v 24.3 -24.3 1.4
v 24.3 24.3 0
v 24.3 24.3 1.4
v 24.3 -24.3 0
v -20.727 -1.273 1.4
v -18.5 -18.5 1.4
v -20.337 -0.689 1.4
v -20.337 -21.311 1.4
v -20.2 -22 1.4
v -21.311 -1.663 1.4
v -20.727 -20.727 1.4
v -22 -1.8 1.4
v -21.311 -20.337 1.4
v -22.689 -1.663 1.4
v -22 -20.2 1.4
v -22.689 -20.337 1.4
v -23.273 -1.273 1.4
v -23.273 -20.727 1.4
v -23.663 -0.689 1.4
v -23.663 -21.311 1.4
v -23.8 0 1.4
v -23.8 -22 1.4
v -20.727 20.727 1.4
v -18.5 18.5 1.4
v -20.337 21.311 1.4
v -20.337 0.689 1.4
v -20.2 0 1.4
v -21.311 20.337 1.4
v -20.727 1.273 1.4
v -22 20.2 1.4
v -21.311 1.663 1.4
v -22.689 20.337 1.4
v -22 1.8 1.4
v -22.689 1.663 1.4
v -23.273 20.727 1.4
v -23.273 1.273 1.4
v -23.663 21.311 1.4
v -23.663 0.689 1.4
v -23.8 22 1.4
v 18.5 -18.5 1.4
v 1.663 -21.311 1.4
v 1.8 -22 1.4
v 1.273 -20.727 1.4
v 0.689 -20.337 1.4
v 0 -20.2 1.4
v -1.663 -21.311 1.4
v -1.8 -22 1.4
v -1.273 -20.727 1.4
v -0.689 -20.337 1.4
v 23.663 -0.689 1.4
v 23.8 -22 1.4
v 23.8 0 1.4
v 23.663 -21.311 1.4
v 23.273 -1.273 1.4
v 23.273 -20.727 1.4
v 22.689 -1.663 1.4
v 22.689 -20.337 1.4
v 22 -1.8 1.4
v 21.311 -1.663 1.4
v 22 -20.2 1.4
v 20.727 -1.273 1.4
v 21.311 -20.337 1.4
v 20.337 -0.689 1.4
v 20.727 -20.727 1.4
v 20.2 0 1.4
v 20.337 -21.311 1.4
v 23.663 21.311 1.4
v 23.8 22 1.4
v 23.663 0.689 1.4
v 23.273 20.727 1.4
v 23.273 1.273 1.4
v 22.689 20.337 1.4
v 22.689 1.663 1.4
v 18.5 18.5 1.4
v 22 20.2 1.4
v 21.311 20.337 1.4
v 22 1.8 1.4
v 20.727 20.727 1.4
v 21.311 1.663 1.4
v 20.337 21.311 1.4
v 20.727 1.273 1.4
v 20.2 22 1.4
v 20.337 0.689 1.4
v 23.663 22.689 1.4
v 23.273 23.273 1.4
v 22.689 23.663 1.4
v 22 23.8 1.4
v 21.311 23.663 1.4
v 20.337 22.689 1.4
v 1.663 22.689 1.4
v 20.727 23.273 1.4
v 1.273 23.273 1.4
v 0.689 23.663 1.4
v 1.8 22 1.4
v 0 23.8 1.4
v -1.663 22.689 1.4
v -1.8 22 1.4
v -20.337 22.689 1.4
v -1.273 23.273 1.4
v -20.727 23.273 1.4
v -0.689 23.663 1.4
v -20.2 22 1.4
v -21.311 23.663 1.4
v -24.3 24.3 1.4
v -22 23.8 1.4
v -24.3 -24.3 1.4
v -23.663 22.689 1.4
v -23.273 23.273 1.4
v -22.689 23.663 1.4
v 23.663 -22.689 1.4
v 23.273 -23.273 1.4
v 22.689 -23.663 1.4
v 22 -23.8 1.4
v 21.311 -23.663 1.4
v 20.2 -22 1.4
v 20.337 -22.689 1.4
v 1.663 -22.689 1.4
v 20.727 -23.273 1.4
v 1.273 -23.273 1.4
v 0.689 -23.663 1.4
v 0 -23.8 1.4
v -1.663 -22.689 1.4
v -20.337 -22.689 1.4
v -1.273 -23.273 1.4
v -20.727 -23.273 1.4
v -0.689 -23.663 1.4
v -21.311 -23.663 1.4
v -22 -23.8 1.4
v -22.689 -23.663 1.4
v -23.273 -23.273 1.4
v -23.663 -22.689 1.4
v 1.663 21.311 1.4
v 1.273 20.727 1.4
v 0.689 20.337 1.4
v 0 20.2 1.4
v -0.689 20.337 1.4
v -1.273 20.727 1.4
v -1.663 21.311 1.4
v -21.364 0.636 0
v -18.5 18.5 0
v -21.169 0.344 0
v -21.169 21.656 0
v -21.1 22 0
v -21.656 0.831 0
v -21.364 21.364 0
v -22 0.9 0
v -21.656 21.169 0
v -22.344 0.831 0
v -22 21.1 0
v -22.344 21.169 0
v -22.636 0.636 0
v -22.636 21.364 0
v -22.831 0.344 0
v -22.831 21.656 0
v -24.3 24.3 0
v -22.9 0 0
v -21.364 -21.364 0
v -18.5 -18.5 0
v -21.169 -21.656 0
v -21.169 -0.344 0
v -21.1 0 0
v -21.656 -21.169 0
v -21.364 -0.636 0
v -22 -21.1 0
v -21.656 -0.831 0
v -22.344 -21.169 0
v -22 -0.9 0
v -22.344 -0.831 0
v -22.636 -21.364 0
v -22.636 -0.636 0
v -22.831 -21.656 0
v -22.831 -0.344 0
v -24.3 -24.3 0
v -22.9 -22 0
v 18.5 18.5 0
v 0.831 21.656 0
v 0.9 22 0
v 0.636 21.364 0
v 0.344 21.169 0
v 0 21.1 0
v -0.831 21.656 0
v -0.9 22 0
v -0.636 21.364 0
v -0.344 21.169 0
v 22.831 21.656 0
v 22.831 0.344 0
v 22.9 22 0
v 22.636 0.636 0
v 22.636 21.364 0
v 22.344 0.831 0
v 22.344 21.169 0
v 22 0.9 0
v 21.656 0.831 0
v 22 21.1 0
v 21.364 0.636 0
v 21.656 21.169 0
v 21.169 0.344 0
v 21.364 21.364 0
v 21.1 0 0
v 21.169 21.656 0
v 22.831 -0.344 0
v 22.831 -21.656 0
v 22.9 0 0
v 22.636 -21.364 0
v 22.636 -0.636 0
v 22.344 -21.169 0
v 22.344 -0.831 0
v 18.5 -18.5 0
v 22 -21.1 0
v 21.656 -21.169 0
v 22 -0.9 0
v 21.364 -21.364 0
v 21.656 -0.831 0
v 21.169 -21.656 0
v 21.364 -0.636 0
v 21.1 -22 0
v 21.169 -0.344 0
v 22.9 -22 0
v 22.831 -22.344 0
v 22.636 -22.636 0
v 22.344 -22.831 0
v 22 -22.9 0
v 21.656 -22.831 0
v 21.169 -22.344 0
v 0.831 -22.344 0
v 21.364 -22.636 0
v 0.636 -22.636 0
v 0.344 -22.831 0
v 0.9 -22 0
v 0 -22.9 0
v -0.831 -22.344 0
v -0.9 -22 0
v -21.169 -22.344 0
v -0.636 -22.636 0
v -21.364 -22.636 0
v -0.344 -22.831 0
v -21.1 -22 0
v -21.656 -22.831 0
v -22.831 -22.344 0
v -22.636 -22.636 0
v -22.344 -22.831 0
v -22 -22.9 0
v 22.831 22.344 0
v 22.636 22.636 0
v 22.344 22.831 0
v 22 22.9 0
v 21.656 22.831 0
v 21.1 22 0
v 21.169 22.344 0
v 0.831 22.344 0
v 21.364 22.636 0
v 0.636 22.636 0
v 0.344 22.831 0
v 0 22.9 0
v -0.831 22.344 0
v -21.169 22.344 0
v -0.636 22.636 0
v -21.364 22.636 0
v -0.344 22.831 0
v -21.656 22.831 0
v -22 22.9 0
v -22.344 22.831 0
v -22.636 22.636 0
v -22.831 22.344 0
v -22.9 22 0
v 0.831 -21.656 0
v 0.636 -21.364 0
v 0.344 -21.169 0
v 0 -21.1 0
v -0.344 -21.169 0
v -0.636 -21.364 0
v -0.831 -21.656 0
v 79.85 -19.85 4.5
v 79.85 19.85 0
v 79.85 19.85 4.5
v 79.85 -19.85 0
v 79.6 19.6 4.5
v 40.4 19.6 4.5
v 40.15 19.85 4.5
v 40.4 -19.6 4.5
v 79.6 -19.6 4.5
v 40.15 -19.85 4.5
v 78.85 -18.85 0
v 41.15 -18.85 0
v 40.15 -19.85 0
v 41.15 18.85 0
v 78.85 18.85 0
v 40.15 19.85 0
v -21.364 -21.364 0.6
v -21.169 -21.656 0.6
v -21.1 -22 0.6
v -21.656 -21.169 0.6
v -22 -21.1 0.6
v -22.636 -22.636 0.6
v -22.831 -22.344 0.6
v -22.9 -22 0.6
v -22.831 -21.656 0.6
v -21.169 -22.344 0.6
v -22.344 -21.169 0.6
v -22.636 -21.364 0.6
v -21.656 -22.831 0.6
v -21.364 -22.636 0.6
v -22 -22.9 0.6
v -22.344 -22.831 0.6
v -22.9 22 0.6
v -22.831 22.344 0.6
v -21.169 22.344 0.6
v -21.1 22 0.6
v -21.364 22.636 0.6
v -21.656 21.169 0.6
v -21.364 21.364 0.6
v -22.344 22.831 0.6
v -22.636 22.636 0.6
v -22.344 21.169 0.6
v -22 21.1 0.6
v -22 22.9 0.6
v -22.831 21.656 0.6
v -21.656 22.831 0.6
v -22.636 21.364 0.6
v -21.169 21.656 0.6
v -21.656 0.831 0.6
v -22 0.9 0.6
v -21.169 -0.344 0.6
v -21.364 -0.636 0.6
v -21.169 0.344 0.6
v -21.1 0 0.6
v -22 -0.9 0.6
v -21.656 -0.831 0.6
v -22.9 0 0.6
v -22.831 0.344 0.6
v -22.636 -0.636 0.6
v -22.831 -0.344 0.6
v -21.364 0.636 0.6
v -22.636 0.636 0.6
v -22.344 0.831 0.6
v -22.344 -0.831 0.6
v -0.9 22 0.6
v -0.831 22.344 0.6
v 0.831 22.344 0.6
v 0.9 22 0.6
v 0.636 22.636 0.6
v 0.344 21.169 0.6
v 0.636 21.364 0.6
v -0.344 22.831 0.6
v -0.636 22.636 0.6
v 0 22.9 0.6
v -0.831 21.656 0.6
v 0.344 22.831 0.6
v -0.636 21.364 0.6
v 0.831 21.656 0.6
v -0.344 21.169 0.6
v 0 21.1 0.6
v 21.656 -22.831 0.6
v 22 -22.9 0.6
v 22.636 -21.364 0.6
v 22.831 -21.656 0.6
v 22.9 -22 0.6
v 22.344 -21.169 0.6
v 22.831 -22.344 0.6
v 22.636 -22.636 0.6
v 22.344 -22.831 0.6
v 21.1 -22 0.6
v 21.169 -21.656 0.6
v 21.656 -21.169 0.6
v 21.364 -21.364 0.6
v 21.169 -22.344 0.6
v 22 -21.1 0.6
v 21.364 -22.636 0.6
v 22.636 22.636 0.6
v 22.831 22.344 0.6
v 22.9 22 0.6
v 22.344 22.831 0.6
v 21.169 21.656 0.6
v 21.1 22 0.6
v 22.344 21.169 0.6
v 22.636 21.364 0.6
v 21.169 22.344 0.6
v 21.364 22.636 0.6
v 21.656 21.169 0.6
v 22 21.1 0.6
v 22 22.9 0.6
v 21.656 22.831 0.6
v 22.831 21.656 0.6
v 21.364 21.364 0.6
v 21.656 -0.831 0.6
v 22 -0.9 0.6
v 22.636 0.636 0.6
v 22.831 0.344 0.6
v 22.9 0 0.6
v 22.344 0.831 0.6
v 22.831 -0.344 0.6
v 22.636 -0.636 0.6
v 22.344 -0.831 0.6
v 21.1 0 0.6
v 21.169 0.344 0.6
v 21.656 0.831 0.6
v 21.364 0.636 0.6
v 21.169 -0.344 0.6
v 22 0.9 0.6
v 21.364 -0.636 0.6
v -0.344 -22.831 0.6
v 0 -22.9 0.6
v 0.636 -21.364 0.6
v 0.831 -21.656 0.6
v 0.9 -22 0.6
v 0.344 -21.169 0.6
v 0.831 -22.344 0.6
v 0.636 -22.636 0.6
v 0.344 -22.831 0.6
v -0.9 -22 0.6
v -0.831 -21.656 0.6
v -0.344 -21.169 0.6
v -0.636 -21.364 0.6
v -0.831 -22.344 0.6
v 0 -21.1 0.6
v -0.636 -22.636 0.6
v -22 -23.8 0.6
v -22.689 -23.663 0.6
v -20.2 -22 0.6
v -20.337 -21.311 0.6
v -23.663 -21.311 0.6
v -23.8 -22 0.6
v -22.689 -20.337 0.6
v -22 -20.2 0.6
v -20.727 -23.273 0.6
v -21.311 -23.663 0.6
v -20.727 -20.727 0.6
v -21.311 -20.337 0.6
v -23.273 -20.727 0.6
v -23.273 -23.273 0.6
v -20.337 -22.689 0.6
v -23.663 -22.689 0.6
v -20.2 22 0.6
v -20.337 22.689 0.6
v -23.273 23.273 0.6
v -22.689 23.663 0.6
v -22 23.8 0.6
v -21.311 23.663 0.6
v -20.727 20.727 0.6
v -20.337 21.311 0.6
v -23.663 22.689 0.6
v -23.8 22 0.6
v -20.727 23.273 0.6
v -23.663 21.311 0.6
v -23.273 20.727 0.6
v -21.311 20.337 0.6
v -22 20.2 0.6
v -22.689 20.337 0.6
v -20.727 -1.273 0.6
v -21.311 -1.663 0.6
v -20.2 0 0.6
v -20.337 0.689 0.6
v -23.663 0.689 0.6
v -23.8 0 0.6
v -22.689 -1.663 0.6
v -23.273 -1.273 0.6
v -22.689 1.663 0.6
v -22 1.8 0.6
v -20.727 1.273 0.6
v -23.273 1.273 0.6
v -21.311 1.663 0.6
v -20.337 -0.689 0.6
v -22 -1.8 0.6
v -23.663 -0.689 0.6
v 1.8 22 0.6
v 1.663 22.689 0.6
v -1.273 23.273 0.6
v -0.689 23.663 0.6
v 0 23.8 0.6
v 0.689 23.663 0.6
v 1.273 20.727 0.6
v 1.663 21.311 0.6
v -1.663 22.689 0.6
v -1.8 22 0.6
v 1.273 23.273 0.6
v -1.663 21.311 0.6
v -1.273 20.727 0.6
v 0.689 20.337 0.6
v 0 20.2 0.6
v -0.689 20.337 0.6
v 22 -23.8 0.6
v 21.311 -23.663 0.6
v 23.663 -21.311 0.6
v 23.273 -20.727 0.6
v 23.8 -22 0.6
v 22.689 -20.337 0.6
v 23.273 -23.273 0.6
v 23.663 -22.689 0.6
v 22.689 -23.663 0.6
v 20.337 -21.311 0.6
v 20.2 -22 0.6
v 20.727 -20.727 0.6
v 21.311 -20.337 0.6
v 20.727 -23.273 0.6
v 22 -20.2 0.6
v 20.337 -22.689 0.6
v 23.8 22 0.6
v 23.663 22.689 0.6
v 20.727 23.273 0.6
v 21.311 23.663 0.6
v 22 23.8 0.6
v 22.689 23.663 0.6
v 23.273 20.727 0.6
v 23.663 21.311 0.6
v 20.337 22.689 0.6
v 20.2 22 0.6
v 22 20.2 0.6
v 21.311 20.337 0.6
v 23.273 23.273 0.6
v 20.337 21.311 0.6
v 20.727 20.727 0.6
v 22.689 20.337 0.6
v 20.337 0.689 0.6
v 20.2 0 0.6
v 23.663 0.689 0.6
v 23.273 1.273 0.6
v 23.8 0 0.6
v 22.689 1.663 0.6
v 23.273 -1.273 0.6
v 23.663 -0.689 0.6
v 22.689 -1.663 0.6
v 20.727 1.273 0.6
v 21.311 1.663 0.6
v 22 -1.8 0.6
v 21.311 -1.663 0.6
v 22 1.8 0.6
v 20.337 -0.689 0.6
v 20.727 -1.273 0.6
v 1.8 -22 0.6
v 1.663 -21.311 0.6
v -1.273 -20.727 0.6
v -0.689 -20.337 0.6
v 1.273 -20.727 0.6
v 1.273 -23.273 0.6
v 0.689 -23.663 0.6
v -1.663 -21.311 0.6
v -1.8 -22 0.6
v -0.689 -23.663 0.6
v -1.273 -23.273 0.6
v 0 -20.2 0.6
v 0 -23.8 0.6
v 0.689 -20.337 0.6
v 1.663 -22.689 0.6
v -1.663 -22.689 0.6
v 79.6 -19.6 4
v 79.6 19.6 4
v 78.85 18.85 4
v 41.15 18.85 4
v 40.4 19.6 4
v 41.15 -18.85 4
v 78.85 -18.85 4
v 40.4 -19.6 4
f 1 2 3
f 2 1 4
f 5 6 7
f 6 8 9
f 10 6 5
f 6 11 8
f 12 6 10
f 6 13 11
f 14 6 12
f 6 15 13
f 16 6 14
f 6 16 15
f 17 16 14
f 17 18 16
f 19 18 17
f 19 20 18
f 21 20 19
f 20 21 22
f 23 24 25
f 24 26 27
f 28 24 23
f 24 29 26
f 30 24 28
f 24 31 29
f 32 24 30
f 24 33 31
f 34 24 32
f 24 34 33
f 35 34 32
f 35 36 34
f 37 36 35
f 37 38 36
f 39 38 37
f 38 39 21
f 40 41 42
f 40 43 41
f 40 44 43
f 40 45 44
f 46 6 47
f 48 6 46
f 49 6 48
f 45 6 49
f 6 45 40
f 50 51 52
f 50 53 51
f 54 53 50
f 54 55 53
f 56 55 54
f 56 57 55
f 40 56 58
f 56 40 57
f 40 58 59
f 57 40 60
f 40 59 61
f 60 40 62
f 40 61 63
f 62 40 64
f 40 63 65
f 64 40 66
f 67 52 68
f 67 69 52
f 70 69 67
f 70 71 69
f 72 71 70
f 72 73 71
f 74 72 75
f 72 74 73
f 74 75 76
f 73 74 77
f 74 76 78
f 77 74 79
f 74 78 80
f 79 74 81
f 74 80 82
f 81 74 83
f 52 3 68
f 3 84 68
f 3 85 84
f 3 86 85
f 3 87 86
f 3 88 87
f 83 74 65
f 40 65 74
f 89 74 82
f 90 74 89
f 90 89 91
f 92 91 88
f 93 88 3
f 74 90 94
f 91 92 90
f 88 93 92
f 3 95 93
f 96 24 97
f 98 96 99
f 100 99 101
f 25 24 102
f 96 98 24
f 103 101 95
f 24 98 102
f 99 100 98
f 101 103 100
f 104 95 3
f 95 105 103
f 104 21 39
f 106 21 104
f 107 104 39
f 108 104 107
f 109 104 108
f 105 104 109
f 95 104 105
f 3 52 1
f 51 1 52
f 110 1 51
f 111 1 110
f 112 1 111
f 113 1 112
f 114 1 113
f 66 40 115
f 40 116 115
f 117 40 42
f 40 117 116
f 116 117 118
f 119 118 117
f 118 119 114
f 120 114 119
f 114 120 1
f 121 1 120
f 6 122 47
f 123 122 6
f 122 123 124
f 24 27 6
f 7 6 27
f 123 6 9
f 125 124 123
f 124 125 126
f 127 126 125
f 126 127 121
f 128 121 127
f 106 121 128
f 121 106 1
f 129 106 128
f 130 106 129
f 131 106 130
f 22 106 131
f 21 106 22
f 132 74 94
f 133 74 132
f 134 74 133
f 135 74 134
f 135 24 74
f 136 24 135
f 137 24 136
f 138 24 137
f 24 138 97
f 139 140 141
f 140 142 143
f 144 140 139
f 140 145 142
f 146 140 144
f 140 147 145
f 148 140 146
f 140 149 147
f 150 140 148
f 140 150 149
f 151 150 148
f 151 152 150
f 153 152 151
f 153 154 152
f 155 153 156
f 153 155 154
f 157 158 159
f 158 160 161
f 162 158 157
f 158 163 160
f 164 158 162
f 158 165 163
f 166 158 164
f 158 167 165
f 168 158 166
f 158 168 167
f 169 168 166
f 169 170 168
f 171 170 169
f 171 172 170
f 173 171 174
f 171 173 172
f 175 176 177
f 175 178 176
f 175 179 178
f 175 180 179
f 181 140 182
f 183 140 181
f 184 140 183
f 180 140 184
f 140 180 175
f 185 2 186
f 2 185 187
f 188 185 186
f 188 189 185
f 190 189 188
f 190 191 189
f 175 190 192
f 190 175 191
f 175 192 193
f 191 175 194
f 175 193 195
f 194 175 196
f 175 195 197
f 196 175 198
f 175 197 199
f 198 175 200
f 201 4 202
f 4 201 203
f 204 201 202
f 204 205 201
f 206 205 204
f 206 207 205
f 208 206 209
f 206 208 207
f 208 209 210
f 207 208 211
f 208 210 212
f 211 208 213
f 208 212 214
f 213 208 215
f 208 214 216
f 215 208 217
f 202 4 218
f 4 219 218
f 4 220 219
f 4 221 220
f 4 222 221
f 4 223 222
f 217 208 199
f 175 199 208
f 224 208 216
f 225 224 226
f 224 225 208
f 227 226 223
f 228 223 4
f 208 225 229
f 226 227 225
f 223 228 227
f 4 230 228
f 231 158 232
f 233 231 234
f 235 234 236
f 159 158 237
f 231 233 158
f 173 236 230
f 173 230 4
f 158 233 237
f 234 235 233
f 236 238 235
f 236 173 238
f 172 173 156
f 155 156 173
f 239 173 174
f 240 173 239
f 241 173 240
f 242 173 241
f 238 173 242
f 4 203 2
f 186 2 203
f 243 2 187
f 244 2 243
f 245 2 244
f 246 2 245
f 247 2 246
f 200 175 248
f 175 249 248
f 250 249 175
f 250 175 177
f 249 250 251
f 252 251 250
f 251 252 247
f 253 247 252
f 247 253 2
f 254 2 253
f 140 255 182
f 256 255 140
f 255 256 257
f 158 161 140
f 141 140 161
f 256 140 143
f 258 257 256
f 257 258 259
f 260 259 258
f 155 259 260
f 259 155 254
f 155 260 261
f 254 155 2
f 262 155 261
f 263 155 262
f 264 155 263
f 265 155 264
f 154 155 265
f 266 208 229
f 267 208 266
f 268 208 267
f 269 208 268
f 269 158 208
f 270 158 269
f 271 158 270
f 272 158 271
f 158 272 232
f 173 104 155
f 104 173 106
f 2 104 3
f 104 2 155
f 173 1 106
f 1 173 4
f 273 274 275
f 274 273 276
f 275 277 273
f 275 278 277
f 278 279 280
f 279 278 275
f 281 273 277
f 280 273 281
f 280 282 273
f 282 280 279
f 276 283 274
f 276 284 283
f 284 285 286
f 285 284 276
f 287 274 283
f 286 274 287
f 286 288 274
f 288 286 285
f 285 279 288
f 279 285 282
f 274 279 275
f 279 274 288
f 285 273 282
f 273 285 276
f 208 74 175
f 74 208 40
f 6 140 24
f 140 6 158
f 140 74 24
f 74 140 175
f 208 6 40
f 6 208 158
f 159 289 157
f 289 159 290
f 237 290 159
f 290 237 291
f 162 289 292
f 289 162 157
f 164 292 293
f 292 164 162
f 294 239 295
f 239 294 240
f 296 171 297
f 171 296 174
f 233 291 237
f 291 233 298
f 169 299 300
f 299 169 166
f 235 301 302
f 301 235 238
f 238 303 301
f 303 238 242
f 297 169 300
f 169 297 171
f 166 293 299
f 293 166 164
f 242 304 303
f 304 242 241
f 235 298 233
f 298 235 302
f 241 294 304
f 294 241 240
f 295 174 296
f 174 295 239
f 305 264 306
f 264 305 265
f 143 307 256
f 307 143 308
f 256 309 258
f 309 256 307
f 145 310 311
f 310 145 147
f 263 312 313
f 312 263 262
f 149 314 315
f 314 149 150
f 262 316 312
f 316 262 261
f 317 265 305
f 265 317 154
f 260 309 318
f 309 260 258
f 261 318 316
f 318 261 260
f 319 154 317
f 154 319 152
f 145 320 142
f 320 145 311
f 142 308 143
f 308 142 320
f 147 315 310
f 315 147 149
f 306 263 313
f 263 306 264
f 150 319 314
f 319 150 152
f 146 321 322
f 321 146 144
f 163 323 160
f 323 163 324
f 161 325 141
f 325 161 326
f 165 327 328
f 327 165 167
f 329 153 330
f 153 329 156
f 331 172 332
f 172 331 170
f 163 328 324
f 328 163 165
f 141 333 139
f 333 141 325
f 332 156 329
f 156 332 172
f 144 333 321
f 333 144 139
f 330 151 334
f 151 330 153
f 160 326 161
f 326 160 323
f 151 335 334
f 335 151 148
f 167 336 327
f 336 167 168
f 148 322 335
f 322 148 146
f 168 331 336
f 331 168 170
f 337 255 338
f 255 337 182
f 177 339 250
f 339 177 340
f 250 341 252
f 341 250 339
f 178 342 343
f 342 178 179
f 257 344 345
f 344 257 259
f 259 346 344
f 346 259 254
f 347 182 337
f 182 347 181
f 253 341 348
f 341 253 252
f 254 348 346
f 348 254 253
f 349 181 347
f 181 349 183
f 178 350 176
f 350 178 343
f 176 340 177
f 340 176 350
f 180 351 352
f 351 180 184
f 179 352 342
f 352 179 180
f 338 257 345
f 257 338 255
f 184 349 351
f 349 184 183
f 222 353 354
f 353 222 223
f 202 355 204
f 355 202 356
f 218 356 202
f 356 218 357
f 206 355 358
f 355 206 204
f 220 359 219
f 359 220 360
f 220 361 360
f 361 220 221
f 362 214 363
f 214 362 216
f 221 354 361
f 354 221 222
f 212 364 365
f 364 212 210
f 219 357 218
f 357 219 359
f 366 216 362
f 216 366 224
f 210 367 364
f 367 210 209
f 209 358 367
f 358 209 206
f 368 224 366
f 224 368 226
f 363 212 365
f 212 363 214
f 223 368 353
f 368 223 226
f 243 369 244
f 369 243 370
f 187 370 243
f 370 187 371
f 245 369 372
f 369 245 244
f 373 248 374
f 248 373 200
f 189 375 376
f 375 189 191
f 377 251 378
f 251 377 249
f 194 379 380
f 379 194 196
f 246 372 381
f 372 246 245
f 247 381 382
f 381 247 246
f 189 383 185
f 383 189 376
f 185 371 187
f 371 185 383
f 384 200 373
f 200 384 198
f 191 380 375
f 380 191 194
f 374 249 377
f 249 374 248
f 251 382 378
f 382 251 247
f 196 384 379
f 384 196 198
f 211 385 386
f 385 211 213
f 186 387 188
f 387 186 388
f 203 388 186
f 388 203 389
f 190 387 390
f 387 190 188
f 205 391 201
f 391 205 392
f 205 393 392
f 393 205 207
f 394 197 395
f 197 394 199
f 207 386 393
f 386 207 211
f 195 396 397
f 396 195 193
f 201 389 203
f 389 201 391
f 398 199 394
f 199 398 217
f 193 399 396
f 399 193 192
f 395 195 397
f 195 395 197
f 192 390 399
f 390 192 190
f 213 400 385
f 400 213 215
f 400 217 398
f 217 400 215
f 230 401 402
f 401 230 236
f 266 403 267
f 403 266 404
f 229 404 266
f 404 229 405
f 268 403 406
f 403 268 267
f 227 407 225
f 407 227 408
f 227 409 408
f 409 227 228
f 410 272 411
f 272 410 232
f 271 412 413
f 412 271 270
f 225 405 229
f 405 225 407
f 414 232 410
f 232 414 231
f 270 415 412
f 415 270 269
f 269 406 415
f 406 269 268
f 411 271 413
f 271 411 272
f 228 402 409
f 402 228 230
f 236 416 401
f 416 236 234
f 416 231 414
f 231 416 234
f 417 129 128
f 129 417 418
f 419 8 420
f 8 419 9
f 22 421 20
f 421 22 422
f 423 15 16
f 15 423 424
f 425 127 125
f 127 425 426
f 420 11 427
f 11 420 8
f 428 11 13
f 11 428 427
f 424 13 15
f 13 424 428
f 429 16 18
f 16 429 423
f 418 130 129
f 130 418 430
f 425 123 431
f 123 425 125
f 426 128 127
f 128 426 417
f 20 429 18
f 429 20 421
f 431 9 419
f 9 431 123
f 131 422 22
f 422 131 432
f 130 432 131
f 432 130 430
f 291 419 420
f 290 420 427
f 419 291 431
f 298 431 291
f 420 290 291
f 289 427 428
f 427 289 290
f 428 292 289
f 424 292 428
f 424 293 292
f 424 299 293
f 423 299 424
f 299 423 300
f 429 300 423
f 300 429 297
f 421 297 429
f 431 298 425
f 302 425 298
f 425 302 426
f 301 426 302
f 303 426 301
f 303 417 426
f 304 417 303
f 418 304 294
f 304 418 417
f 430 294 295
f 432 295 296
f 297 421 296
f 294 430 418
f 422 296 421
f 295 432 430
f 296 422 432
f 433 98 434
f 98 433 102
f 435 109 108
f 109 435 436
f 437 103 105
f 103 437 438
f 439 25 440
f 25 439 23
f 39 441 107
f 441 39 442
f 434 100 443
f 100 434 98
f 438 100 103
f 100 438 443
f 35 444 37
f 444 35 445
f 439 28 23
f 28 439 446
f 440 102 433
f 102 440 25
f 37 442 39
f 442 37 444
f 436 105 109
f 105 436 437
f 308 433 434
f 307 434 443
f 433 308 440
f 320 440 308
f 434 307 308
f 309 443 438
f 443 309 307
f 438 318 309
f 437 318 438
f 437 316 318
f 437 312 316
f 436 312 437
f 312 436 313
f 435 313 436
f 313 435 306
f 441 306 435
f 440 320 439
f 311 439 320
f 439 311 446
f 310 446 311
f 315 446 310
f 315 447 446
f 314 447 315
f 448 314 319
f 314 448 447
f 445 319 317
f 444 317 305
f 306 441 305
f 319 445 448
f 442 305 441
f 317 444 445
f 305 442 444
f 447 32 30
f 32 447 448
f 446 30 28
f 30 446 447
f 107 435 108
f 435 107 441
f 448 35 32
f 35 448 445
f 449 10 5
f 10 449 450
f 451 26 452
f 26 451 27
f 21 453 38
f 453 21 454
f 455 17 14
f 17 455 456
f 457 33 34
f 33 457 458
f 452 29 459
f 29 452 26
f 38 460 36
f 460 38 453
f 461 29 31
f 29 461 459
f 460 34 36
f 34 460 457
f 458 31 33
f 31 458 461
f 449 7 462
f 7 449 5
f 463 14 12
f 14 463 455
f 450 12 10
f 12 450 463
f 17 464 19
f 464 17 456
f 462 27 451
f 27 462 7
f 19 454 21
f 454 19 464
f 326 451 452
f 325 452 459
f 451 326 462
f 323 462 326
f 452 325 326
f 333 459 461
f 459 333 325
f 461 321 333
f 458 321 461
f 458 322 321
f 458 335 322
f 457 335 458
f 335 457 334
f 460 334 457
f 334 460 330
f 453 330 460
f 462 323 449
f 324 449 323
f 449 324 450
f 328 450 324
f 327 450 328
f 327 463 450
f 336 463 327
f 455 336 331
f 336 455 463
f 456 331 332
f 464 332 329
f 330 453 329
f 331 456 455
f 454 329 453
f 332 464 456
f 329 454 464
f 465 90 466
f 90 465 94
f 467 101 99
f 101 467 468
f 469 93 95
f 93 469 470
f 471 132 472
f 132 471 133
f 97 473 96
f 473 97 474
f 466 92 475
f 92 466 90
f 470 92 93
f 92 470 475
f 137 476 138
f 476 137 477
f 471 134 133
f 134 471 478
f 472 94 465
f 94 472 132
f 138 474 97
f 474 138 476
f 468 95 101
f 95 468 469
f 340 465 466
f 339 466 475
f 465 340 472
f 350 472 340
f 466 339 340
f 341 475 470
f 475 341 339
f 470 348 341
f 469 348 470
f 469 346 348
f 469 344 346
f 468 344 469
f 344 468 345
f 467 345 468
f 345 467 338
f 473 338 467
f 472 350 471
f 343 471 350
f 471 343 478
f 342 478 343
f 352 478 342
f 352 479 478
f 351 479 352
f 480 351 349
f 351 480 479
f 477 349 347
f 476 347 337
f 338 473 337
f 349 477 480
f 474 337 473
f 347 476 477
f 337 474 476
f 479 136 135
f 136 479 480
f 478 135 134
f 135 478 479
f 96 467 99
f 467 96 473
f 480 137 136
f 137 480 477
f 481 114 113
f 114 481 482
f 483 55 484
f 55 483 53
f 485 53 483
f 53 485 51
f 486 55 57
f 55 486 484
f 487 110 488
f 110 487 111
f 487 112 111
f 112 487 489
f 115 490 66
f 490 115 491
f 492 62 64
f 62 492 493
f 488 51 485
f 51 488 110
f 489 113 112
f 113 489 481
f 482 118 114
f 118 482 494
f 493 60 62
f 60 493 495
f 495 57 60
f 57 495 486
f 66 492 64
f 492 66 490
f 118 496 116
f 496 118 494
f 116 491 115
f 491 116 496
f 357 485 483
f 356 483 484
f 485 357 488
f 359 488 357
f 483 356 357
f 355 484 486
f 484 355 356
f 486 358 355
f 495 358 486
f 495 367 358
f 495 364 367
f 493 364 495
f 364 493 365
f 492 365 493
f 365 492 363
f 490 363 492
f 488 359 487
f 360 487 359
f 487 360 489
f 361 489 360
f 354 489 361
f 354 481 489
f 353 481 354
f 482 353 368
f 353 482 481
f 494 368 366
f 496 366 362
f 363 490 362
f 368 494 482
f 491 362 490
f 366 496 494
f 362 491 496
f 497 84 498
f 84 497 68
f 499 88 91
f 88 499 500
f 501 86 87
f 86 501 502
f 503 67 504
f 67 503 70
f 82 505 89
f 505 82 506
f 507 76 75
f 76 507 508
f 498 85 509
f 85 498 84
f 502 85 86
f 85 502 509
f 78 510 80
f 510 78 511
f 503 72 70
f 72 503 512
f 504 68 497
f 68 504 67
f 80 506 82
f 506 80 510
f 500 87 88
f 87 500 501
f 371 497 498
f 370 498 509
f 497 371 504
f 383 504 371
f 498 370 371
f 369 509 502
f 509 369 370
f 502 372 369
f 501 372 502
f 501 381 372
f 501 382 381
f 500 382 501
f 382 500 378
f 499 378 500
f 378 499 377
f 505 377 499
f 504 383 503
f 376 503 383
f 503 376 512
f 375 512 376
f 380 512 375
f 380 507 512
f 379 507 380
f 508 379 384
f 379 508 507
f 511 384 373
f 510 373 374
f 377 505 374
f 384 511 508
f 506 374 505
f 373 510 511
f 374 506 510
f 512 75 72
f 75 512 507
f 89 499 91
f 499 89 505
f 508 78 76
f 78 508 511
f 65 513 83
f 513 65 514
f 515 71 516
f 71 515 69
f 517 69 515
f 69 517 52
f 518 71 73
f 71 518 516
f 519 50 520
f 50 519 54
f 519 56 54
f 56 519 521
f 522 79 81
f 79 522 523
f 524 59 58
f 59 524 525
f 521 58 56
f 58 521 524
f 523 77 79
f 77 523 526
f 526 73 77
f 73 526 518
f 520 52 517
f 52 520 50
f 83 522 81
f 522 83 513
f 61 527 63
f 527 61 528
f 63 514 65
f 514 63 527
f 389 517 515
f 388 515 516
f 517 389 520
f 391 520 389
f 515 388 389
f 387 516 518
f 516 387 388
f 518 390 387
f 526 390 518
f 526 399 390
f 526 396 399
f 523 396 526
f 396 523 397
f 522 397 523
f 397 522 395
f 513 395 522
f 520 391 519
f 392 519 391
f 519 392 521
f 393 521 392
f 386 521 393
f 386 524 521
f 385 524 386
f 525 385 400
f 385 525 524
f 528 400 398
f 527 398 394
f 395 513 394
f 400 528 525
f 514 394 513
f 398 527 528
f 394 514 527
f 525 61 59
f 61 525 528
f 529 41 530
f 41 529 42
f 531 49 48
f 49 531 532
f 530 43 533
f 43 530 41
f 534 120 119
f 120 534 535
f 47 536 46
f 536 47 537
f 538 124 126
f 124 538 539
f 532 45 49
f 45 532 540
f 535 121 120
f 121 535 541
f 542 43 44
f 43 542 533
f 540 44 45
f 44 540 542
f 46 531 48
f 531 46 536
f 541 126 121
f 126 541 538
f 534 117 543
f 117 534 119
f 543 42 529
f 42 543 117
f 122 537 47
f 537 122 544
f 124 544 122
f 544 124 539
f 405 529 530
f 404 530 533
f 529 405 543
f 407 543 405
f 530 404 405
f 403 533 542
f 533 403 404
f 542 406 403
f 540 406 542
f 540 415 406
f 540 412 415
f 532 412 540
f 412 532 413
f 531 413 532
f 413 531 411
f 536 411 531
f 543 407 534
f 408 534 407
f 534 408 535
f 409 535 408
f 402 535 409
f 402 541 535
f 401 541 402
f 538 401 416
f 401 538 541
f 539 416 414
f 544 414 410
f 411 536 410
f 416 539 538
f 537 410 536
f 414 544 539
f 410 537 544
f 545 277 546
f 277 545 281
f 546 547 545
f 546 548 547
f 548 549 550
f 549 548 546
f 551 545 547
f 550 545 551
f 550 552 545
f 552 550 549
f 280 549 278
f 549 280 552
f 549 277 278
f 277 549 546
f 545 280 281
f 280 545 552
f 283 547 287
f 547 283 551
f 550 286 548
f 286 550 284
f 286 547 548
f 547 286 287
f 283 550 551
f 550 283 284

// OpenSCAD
//OpenSCAD-Skript

//Moduldefinition mit Parametern
module rahmen (
//Parameter
dsh2=1.8,hght=1.4,dist=44,leno=48.6,wdth=37,
lngthi=39.7,hghti=4.5,retr=0.5,disti=37.7,
//Schneidschrauben 2mmx6mm
skd2=3.6,       //Schraubenkopfdurchmesser 2mm-Schraube
skh2=1.3,       //Schraubenkopfhöhe 2mm-Schraube
dsh2=1.8,       //Schaftdurchmesser 2mm-Schraube
dvst2=4.4,      //Verstärkung für 2mm-Schraube
)
//Beginn Modul
{
difference(){   //difference 1
union(){        //union 1
difference(){   //difference 2
union(){        //union 2
    //alles, was vor der nächsten geschweiften Klammer steht, wird zusammengefügt (union 2)

//Rahmenkörper
translate([-leno/2,-leno/2,0]) cube([leno,leno,hght]);
//Innenrahmen
translate([60-lngthi/2,-lngthi/2,0]) cube([lngthi,lngthi,hghti]);
}               //union 2 end
    //alles, was vor der nächsten geschweiften Klammer steht, wird davon abgezogen (difference 2)
//Ausschnitt
translate([-wdth/2,-wdth/2,-0.1]) cube([wdth,wdth,3*hght]);
//Bohrungen Schrauben
translate([-dist/2,-dist/2,-0.1])  cylinder(d=dsh2,h=10,$fn=16);
translate([-dist/2,+dist/2,-0.1])  cylinder(d=dsh2,h=10,$fn=16);
translate([-dist/2,0,-0.1])  cylinder(d=dsh2,h=10,$fn=16);
translate([0,+dist/2,-0.1])  cylinder(d=dsh2,h=10,$fn=16);
translate([+dist/2,-dist/2,-0.1])  cylinder(d=dsh2,h=10,$fn=16);
translate([+dist/2,+dist/2,-0.1])  cylinder(d=dsh2,h=10,$fn=16);
translate([+dist/2,0,-0.1])  cylinder(d=dsh2,h=10,$fn=16);
translate([0,-dist/2,-0.1])  cylinder(d=dsh2,h=10,$fn=16);
//Bohrungen Schraubenköpfe
translate([-dist/2,-dist/2,0.6])  cylinder(d=skd2,h=10,$fn=16);
translate([-dist/2,+dist/2,0.6])  cylinder(d=skd2,h=10,$fn=16);
translate([-dist/2,0,0.6])  cylinder(d=skd2,h=10,$fn=16);
translate([0,+dist/2,0.6])  cylinder(d=skd2,h=10,$fn=16);
translate([+dist/2,-dist/2,0.6])  cylinder(d=skd2,h=10,$fn=16);
translate([+dist/2,+dist/2,0.6])  cylinder(d=skd2,h=10,$fn=16);
translate([+dist/2,0,0.6])  cylinder(d=skd2,h=10,$fn=16);
translate([0,-dist/2,0.6])  cylinder(d=skd2,h=10,$fn=16);

//Ausschnitte Innenrahmen
translate([60-lngthi/2+retr/2,-lngthi/2+retr/2,hghti-retr]) cube([lngthi-retr,lngthi-retr,2*hghti]);
translate([60-lngthi/2+2*retr,-lngthi/2+2*retr,-0.1]) cube([lngthi-4*retr,lngthi-4*retr,2*hghti]);
}  //difference 2 end
    //alles, was vor der nächsten geschweiften Klammer steht, wird dazu hinzugefügt (union 1)


}               //union 1 end
    //alles, was vor der nächsten geschweiften Klammer steht, wird davon wieder abgezogen (difference 1)

}               //difference 1 end

}  //module end


//Hier werden Instanzen des Moduls aufgerufen
translate([0,0,0]) rahmen();
